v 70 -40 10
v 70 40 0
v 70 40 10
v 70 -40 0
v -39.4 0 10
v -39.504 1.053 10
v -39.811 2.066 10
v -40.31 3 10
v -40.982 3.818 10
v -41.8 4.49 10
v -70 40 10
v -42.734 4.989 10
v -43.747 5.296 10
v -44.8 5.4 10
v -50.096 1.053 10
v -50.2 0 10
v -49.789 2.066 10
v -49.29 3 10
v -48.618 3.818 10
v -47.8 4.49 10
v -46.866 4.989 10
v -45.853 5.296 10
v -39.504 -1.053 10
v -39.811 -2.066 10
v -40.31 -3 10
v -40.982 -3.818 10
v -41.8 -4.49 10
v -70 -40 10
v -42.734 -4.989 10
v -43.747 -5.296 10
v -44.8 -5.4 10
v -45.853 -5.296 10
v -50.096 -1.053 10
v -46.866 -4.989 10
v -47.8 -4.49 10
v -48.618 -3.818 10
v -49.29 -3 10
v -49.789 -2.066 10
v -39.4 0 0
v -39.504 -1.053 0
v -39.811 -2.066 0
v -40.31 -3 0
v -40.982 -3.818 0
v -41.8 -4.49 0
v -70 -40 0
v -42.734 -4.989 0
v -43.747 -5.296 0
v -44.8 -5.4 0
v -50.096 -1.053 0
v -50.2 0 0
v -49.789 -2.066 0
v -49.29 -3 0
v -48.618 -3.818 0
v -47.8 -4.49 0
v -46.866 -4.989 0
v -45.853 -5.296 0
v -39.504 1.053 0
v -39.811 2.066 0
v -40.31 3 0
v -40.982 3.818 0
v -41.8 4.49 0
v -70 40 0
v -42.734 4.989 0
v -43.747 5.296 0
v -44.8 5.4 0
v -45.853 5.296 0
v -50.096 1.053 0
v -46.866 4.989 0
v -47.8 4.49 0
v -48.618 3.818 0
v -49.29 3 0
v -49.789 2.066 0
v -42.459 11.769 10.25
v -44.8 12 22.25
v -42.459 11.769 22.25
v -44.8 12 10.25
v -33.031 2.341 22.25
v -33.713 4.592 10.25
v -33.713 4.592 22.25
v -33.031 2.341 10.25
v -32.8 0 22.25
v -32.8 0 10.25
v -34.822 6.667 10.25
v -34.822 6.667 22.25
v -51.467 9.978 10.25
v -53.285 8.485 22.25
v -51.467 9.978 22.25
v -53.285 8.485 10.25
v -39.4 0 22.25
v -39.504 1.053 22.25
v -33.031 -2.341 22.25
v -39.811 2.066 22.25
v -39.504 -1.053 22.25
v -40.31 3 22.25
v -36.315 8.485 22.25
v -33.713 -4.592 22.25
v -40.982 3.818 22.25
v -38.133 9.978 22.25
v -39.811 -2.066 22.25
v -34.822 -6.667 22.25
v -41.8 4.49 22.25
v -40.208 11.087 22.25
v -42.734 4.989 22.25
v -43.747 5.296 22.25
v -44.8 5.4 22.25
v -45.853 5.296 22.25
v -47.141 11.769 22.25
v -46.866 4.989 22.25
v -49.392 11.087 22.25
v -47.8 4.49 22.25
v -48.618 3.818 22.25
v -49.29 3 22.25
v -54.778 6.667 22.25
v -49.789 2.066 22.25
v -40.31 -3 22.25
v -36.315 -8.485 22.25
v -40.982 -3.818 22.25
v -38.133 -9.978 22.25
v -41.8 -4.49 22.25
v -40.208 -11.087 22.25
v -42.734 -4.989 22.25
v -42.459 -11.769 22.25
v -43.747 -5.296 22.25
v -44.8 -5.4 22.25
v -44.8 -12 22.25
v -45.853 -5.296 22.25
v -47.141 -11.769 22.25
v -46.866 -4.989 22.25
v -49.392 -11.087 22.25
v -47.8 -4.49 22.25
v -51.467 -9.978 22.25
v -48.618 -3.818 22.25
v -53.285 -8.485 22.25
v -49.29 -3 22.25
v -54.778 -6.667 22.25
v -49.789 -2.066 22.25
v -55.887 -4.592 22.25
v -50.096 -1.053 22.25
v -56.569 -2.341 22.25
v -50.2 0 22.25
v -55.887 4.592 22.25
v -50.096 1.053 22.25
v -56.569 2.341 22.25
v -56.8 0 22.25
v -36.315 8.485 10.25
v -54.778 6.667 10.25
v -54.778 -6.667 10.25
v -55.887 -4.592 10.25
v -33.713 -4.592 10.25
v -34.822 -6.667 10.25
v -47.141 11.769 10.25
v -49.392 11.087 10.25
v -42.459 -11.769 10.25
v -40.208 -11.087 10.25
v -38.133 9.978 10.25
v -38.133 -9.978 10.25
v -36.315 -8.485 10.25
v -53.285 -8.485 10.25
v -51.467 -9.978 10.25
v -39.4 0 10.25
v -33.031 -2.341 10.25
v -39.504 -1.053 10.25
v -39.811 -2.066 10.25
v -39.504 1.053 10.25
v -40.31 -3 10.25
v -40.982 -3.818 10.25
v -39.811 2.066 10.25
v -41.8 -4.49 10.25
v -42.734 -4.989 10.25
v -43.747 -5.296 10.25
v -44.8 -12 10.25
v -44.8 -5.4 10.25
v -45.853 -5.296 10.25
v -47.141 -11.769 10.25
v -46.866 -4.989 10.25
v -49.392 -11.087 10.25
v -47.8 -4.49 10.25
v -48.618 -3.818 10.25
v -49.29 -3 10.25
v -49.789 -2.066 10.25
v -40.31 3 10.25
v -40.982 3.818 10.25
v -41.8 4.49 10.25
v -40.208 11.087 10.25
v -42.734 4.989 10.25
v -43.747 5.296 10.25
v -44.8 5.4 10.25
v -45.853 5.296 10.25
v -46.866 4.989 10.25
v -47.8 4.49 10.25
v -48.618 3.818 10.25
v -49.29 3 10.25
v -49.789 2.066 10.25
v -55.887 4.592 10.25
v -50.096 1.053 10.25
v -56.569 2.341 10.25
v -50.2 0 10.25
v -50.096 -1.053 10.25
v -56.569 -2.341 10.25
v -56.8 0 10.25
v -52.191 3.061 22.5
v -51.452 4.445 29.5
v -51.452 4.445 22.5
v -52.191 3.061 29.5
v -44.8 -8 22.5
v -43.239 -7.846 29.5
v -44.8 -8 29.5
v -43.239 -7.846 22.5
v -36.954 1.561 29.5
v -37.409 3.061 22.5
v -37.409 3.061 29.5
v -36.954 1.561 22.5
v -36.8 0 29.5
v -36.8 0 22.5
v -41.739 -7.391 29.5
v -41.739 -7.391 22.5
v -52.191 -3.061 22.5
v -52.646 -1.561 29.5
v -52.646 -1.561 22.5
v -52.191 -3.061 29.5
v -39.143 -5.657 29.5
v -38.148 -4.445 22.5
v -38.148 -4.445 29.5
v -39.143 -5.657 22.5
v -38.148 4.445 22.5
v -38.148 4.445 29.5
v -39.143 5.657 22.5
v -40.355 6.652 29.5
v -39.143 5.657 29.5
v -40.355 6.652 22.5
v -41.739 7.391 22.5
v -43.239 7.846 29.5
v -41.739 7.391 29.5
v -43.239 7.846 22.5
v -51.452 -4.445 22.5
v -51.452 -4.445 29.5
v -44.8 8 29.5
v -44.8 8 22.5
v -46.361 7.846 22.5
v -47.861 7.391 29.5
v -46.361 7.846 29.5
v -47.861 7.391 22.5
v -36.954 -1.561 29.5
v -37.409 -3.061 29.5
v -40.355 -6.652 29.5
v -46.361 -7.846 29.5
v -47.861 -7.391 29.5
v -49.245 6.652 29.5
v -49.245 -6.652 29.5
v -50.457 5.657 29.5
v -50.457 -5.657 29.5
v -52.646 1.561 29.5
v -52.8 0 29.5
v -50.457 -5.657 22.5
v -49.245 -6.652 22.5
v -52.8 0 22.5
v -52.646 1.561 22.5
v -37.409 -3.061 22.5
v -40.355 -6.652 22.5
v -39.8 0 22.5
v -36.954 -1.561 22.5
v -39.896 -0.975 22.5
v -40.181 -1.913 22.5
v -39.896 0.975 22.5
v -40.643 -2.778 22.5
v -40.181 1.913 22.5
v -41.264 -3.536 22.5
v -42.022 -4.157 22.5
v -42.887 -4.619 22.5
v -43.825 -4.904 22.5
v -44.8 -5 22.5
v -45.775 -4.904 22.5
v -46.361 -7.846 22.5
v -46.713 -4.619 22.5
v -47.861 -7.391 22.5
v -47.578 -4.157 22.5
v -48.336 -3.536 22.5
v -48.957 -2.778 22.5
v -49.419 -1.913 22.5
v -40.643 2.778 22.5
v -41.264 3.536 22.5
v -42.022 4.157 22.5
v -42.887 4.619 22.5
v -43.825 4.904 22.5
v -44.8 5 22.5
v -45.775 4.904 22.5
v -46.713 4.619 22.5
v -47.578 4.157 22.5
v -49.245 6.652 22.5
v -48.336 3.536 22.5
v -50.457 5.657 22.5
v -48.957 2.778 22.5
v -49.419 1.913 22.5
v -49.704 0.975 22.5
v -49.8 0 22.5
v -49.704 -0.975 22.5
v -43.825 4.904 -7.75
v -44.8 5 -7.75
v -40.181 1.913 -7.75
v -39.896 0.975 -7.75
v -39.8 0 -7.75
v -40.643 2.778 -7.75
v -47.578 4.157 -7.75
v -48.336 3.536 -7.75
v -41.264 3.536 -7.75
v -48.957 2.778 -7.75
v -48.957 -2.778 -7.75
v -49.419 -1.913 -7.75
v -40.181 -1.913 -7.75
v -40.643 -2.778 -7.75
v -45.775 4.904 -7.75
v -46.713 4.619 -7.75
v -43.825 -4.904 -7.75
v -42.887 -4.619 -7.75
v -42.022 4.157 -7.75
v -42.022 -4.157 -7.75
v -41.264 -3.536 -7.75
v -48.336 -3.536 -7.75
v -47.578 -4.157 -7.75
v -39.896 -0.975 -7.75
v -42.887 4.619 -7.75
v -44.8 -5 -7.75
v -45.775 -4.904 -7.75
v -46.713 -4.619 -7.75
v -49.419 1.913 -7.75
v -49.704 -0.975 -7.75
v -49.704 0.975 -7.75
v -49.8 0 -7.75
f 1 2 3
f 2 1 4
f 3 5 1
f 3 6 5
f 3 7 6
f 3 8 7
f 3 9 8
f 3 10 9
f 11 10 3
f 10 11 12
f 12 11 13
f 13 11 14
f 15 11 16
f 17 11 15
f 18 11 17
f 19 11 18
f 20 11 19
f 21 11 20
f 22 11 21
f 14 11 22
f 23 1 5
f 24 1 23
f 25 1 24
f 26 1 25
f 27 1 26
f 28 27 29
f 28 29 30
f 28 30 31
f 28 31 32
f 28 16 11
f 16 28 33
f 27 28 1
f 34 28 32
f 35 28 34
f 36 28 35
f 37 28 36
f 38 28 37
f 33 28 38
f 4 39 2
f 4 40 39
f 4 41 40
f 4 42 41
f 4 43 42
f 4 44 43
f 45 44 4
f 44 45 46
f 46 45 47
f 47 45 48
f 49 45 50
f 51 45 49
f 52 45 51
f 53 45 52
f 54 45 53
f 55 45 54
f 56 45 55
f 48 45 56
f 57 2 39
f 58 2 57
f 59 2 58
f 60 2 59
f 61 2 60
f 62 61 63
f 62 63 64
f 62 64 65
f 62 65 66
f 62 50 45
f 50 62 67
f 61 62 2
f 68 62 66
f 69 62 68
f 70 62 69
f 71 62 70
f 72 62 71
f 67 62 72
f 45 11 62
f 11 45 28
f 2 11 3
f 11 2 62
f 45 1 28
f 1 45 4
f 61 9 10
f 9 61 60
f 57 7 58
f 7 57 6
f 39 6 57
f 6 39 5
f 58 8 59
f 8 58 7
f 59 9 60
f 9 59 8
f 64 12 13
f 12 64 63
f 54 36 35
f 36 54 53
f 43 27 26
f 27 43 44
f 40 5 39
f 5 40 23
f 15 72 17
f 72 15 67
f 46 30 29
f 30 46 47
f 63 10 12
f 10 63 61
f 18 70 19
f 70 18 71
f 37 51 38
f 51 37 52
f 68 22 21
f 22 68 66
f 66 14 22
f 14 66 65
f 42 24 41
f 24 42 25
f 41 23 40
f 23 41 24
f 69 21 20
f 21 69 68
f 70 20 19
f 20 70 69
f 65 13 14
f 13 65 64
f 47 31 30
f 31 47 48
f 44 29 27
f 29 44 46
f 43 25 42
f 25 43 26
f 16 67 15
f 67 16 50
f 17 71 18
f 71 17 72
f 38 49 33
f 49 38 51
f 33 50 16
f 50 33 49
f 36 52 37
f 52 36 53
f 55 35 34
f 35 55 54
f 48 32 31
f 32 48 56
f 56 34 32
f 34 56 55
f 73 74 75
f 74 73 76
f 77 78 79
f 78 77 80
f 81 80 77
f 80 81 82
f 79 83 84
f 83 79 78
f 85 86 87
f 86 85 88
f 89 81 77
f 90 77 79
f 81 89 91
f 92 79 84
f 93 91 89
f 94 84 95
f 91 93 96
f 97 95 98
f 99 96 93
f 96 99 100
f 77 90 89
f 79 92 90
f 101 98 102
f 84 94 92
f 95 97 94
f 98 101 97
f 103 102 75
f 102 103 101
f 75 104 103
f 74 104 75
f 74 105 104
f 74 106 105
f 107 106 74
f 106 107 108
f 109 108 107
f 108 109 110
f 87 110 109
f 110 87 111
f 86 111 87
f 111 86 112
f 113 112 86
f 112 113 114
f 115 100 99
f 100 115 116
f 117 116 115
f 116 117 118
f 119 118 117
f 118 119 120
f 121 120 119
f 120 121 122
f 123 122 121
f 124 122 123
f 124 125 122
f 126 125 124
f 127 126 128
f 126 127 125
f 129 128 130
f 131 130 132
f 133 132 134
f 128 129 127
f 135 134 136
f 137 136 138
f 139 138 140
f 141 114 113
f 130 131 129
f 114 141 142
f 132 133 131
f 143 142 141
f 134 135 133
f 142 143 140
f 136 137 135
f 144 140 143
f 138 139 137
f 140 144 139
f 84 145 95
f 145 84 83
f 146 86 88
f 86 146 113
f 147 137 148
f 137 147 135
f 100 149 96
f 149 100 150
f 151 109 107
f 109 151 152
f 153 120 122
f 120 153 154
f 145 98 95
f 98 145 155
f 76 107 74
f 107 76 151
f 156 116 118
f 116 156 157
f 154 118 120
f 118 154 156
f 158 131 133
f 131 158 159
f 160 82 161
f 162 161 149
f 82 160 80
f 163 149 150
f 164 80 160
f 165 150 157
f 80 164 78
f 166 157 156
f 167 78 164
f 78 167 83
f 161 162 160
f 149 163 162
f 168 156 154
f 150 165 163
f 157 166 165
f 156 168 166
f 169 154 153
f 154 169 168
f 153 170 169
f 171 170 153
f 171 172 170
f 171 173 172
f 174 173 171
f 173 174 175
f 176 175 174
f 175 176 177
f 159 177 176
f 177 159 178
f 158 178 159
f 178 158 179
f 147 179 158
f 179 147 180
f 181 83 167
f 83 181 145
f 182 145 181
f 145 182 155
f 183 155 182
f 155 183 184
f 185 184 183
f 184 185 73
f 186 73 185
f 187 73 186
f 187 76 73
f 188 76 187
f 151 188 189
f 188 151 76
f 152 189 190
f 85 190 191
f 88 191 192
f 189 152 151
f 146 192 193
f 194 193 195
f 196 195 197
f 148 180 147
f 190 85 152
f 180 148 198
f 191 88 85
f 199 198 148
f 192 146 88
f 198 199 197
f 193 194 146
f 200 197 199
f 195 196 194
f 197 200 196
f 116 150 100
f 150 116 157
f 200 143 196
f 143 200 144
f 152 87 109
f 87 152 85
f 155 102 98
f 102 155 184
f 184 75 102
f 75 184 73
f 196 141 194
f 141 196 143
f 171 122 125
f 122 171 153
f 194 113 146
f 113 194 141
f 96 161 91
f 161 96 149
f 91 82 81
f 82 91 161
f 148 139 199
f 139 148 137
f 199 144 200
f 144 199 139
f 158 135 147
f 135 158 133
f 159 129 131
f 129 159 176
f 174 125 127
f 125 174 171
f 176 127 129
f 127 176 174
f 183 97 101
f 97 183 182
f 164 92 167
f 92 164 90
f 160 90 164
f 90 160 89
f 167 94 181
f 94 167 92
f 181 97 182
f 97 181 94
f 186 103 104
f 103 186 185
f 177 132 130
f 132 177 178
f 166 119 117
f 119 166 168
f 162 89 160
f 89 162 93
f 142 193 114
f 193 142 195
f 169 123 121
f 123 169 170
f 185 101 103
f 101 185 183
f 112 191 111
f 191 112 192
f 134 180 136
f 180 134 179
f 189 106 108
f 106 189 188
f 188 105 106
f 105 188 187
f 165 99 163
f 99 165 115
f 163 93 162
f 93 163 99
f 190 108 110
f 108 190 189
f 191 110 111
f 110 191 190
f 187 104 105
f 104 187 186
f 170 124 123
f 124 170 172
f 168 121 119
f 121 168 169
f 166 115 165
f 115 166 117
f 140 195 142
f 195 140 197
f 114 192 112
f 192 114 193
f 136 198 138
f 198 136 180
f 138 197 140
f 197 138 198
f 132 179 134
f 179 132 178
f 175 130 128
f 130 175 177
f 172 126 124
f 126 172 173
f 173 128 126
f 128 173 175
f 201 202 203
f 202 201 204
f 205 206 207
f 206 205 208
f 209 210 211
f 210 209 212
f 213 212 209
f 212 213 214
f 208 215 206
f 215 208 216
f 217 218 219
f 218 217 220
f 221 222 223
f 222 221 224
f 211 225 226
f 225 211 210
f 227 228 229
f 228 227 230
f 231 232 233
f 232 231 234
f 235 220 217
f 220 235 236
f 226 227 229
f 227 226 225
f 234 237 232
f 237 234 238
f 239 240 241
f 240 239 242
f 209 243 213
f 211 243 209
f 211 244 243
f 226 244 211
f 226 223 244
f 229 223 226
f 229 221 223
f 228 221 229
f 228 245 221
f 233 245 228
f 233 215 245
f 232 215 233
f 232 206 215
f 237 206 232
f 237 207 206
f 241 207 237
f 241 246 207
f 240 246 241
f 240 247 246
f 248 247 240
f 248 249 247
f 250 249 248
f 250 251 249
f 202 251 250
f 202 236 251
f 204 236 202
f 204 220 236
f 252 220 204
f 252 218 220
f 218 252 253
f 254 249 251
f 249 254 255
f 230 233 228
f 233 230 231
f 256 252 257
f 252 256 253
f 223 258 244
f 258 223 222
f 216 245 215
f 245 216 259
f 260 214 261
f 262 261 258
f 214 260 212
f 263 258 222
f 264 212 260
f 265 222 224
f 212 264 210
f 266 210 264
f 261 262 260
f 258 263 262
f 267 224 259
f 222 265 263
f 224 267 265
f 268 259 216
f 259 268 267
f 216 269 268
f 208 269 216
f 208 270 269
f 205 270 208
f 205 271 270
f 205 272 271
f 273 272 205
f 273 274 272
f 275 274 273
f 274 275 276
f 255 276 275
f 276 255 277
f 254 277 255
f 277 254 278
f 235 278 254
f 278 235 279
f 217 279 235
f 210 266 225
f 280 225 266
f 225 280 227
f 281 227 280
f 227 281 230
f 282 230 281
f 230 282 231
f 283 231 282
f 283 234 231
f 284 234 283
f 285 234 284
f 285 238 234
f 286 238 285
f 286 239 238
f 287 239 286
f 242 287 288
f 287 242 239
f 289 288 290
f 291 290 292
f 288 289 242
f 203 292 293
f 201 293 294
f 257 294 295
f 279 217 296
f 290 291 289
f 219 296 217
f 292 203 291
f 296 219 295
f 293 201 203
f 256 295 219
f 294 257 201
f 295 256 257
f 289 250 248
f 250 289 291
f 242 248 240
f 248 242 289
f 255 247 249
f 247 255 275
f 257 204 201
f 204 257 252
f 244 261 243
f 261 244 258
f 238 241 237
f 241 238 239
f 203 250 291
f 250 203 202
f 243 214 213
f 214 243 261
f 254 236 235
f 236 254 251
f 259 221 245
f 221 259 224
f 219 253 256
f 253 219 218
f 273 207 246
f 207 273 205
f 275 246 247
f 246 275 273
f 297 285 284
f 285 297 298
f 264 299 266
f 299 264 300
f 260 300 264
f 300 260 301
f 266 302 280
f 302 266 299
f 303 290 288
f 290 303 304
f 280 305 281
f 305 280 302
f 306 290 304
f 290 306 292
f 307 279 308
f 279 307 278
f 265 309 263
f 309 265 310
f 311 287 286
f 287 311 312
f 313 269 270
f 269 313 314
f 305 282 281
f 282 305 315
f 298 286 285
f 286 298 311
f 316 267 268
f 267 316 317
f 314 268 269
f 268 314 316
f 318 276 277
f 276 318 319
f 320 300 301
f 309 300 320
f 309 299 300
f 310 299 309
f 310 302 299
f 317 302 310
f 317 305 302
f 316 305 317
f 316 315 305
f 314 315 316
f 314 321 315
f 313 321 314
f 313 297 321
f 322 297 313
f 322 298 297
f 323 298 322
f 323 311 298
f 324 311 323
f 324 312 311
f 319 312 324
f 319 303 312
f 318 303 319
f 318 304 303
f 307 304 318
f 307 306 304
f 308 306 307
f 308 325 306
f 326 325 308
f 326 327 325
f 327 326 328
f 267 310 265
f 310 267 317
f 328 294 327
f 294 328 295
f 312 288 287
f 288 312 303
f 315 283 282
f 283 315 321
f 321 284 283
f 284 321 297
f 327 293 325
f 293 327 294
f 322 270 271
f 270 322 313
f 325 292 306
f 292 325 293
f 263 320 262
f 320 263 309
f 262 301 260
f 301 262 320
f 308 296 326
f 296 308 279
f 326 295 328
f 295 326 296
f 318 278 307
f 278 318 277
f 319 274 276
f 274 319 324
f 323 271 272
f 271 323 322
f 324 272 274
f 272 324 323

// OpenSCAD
$fn = 32;

// ------------------------------------------------------------------------
// Standoff columns: 1 d24 standoffs, bolts d10
// Every part is its own module, assembly() places them once.
// ------------------------------------------------------------------------

// --- part 1 ---
module base_plate() {
  difference() {
    translate([-70, -40, 0]) cube([140, 80, 10]);
    translate([-44.8, 0, -1]) cylinder(h = 12, d = 10.8);
  }
}

// --- part 2 ---
module spacer() {
  difference() {
      translate([0, 0, 0]) cylinder(h = 12, d = 24);
      translate([0, 0, -1]) cylinder(h = 14, d = 10.8);
    }
}

// --- part 3 ---
module bolt() {
  cylinder(h = 7, d = 16);
  translate([0, 0, -30.25]) cylinder(h = 30.25, d = 10);
}

// --- assembly ---
module assembly() {
  translate([0, 0, 0]) rotate([0, 0, 0]) base_plate();
  translate([-44.8, 0, 10.25]) rotate([0, 0, 0]) spacer();
  translate([-44.8, 0, 22.5]) rotate([0, 0, 0]) bolt();
}

assembly();
